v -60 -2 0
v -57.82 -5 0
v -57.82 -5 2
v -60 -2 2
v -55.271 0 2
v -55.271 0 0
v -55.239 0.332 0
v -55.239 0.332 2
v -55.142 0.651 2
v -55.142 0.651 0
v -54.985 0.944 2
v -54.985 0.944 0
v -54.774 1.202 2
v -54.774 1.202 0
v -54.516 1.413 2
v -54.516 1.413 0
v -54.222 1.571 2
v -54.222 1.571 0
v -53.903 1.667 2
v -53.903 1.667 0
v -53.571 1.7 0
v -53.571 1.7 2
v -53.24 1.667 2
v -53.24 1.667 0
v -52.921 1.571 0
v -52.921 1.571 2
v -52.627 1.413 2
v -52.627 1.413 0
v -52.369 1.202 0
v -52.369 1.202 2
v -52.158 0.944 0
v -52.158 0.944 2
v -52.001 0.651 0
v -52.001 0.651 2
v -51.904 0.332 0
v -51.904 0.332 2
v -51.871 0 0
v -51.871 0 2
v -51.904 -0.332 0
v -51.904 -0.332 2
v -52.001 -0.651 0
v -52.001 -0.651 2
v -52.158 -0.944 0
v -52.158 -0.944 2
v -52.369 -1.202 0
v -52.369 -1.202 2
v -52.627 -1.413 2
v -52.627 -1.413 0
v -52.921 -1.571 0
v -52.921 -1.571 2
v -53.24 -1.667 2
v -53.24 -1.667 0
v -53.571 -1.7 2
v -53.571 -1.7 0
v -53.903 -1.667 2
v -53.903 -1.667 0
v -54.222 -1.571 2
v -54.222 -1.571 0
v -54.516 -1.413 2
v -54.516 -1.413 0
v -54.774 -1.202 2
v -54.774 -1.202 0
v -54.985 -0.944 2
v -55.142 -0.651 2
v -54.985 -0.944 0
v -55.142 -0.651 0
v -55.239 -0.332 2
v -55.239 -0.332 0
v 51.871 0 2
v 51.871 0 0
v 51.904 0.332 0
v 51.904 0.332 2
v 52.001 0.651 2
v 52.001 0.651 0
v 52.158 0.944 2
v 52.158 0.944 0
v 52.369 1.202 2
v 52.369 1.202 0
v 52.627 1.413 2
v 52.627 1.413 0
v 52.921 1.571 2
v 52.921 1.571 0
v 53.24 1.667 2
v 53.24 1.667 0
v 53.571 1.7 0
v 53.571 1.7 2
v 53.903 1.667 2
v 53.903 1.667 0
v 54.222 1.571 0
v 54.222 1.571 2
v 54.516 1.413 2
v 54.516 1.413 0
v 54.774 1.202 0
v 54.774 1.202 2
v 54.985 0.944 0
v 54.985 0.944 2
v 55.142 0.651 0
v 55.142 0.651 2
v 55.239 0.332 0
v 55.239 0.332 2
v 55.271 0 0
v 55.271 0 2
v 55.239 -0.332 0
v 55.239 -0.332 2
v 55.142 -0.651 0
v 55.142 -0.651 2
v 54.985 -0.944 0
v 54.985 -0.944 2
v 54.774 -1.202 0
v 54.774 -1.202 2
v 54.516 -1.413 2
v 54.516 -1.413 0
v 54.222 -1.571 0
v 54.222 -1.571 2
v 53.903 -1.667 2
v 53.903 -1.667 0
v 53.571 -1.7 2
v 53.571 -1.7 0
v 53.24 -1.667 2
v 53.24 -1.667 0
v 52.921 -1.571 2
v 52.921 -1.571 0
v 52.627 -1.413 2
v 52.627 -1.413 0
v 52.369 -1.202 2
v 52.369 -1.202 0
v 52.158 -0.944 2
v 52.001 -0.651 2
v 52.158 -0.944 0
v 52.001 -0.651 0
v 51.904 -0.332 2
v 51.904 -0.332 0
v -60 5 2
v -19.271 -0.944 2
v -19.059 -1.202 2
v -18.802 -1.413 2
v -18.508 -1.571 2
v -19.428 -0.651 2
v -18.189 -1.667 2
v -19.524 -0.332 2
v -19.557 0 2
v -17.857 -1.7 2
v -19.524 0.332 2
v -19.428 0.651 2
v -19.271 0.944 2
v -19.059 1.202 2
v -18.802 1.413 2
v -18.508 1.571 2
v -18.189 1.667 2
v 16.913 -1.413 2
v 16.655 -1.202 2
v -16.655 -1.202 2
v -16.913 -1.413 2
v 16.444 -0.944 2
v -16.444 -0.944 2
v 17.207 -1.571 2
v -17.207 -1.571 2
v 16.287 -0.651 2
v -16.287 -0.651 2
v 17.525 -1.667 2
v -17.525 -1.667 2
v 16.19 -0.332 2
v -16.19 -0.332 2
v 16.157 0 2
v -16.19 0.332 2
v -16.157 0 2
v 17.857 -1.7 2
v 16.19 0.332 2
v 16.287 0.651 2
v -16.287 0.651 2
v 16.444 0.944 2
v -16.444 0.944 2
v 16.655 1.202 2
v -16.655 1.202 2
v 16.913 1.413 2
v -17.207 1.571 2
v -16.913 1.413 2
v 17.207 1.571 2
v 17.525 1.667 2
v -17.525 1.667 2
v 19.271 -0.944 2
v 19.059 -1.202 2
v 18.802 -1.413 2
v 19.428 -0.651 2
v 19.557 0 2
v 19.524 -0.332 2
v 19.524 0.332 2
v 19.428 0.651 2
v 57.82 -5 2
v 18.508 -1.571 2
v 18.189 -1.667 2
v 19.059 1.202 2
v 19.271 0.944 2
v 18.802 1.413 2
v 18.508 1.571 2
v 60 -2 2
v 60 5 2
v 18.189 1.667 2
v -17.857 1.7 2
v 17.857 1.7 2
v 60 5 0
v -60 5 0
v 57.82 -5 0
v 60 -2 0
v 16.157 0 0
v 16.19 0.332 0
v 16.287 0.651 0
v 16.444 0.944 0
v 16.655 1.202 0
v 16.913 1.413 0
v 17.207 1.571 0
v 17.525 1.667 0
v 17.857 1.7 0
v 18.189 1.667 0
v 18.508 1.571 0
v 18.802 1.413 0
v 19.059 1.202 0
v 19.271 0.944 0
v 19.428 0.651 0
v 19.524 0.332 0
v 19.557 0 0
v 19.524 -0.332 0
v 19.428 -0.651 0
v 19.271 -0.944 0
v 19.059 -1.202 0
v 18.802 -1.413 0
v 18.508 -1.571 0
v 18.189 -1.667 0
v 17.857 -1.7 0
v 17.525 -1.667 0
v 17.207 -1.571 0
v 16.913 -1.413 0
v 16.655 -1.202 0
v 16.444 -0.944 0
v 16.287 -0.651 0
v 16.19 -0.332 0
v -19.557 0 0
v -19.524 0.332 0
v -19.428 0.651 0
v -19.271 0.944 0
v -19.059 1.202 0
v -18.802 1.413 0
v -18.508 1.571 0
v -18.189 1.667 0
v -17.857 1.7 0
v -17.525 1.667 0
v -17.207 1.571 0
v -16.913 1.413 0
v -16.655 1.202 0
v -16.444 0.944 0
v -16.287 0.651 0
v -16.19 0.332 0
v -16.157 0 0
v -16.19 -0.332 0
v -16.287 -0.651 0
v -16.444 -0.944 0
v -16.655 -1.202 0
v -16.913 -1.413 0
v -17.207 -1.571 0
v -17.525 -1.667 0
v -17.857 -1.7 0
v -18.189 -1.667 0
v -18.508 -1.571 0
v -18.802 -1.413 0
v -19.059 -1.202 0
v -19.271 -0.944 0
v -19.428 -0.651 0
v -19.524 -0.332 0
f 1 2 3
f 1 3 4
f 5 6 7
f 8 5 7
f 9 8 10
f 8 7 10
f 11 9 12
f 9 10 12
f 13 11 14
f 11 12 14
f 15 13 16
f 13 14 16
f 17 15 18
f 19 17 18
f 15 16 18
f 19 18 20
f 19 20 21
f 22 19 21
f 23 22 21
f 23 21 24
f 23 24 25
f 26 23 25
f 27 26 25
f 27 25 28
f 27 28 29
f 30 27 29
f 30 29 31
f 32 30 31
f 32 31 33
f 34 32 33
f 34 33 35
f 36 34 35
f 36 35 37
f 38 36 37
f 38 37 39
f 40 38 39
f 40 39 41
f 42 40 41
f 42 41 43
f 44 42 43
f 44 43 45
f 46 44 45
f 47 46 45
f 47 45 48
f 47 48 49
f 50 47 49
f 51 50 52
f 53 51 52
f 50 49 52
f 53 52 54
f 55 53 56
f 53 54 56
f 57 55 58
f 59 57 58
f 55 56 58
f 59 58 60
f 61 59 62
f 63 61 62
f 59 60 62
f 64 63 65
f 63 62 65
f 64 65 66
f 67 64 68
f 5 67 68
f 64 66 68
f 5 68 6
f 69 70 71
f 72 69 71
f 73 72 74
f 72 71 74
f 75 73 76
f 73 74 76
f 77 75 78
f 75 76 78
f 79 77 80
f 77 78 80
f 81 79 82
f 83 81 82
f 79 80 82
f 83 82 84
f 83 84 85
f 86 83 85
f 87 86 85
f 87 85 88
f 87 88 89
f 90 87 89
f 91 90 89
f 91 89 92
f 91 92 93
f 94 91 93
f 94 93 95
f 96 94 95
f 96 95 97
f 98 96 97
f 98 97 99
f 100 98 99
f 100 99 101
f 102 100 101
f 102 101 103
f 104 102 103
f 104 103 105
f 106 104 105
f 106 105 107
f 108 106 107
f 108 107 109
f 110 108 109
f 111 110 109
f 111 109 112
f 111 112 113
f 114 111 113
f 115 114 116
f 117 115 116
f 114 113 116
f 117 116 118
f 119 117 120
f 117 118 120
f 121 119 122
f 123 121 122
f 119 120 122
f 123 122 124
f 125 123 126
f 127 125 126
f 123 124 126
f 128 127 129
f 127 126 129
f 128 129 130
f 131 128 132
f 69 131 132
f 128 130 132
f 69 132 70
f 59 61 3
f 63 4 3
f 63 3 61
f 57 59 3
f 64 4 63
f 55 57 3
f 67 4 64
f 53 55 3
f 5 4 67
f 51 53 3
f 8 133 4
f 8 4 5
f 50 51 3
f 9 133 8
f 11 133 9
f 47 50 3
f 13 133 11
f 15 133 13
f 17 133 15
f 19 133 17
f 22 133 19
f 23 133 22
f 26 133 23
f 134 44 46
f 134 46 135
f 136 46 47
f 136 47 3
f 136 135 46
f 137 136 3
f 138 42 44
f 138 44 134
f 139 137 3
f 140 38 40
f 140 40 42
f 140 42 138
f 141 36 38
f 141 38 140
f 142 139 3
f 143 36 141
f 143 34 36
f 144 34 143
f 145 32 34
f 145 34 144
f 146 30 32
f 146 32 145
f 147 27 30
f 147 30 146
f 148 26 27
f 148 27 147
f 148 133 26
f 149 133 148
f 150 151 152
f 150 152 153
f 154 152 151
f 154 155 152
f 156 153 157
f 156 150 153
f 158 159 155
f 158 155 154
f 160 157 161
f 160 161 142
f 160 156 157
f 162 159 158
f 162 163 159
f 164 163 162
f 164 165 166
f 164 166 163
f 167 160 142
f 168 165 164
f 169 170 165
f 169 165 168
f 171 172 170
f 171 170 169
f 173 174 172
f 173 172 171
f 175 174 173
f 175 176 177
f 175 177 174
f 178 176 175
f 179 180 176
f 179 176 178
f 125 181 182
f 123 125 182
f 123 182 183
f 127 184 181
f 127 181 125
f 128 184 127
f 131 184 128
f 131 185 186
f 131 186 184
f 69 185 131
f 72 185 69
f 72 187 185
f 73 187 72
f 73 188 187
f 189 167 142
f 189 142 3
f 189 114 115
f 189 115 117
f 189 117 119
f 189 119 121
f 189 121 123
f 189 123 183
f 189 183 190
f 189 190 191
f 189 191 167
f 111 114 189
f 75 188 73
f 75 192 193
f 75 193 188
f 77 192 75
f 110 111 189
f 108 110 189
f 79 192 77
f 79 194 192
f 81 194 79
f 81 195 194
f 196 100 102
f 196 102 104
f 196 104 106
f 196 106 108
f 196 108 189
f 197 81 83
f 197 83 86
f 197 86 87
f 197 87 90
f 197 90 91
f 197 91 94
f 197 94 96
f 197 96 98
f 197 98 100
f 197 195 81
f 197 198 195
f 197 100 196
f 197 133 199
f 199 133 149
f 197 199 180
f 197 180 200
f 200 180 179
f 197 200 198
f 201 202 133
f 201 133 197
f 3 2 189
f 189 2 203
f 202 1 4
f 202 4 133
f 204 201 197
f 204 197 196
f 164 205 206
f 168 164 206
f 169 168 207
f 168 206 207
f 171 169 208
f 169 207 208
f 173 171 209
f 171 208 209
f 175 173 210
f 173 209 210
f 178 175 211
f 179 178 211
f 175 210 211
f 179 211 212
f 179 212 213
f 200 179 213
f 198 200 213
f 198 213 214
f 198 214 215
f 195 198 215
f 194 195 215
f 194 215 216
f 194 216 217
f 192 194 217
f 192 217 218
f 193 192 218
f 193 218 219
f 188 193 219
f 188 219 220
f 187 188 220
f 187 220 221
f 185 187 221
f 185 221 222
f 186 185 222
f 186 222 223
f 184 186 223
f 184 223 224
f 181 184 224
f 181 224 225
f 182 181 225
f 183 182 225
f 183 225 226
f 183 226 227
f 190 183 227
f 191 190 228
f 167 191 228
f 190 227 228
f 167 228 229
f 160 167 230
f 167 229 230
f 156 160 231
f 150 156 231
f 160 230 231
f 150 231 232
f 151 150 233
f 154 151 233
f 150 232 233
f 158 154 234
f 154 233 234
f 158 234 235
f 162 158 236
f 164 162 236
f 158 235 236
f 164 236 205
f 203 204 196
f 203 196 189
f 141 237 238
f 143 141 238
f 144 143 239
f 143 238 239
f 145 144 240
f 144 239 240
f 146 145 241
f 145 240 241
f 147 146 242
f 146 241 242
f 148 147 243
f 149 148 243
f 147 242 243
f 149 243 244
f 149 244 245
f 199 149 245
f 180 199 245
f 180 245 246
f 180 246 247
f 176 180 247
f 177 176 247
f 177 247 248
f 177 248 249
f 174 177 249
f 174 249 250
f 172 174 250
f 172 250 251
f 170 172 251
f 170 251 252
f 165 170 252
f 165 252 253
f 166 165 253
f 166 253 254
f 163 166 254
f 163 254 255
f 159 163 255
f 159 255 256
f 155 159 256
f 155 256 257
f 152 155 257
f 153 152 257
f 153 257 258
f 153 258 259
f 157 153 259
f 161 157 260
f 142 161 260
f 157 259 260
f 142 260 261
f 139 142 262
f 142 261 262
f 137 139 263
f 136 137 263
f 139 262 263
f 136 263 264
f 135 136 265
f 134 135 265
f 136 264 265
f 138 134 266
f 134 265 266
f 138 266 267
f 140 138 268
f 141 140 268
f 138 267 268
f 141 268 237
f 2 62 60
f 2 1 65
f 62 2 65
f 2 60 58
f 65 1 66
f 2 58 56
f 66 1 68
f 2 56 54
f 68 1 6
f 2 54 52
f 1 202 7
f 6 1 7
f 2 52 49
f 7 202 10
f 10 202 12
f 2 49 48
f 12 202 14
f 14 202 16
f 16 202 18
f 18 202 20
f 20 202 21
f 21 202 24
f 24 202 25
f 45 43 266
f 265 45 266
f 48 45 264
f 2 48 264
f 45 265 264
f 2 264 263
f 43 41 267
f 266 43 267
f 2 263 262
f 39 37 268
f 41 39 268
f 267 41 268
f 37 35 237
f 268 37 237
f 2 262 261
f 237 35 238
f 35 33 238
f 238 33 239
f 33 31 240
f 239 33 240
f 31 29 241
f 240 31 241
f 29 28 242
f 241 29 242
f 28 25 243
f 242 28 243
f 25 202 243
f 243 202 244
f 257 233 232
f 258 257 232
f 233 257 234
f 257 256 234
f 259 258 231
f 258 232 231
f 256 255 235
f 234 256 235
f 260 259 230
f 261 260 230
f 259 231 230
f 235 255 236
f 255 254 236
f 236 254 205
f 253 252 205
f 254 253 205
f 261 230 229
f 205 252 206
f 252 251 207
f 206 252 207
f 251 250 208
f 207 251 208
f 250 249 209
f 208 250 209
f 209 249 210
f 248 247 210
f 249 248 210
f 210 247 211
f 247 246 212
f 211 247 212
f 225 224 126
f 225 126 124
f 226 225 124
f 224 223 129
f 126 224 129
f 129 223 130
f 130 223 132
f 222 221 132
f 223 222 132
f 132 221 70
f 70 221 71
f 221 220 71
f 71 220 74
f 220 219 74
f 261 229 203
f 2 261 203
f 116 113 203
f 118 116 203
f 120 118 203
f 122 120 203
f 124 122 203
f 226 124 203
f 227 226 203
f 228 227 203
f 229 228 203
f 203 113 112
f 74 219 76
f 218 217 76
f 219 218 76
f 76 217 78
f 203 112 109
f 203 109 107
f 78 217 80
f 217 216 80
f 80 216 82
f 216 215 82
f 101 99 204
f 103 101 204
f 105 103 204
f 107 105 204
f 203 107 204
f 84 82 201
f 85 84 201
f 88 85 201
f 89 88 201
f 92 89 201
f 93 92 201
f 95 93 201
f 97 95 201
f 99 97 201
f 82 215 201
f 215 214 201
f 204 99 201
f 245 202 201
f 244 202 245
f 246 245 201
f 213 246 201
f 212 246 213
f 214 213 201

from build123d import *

# Parameters (mm, degrees)
SKETCH1_W               = 270
SKETCH1_H               = 10
BOSS_EXTRUDE1_DEPTH     = 2
CHAMFER1_SIZE           = 2
M3_CLEARANCE_HOLE1_D    = 3.4
LPATTERN1_COUNT         = 8
LPATTERN1_PITCH         = 35.714285714
CUT_EXTRUDE_THIN1_DEPTH = 10


with BuildPart() as part:
    # Sketch1 → Boss-Extrude1 (new body)
    with BuildSketch(Plane.XY):
        Rectangle(SKETCH1_W, SKETCH1_H)
    extrude(amount=BOSS_EXTRUDE1_DEPTH)

    # Chamfer1
    chamfer1_edges = [part.edges().sort_by_distance(p)[0] for p in [
        (135, -5, 1),
        (-135, -5, 1),
    ]]
    chamfer(chamfer1_edges, length=CHAMFER1_SIZE)

    # M3 Clearance Hole1 (through all)
    with Locations(Plane.XY.offset(2)):
        with Locations((125, 0)):
            m3_clearance_hole1 = Hole(M3_CLEARANCE_HOLE1_D / 2)

    # LPattern1: M3 Clearance Hole1 ×8
    with Locations(*[(-i * LPATTERN1_PITCH, 0, 0) for i in range(1, LPATTERN1_COUNT)]):
        add(m3_clearance_hole1, mode=Mode.SUBTRACT)

    # Sketch4 → Cut-Extrude-Thin1 (cut)
    with BuildSketch(Plane(origin=(0, 0, 0), x_dir=(-1, 0, 0), z_dir=(0, 0, -1))):
        Polygon((160, 105), (-160, 105), (-160, -34.491969623), (-108.772917365, -105), (108.772917365, -105), (160, -34.491969623), align=None)
        Polygon((60, 5), (-60, 5), (-60, -2), (-57.820372416, -5), (57.820372416, -5), (60, -2), align=None, mode=Mode.SUBTRACT)
    extrude(amount=-CUT_EXTRUDE_THIN1_DEPTH, mode=Mode.SUBTRACT)


solid = part.part
